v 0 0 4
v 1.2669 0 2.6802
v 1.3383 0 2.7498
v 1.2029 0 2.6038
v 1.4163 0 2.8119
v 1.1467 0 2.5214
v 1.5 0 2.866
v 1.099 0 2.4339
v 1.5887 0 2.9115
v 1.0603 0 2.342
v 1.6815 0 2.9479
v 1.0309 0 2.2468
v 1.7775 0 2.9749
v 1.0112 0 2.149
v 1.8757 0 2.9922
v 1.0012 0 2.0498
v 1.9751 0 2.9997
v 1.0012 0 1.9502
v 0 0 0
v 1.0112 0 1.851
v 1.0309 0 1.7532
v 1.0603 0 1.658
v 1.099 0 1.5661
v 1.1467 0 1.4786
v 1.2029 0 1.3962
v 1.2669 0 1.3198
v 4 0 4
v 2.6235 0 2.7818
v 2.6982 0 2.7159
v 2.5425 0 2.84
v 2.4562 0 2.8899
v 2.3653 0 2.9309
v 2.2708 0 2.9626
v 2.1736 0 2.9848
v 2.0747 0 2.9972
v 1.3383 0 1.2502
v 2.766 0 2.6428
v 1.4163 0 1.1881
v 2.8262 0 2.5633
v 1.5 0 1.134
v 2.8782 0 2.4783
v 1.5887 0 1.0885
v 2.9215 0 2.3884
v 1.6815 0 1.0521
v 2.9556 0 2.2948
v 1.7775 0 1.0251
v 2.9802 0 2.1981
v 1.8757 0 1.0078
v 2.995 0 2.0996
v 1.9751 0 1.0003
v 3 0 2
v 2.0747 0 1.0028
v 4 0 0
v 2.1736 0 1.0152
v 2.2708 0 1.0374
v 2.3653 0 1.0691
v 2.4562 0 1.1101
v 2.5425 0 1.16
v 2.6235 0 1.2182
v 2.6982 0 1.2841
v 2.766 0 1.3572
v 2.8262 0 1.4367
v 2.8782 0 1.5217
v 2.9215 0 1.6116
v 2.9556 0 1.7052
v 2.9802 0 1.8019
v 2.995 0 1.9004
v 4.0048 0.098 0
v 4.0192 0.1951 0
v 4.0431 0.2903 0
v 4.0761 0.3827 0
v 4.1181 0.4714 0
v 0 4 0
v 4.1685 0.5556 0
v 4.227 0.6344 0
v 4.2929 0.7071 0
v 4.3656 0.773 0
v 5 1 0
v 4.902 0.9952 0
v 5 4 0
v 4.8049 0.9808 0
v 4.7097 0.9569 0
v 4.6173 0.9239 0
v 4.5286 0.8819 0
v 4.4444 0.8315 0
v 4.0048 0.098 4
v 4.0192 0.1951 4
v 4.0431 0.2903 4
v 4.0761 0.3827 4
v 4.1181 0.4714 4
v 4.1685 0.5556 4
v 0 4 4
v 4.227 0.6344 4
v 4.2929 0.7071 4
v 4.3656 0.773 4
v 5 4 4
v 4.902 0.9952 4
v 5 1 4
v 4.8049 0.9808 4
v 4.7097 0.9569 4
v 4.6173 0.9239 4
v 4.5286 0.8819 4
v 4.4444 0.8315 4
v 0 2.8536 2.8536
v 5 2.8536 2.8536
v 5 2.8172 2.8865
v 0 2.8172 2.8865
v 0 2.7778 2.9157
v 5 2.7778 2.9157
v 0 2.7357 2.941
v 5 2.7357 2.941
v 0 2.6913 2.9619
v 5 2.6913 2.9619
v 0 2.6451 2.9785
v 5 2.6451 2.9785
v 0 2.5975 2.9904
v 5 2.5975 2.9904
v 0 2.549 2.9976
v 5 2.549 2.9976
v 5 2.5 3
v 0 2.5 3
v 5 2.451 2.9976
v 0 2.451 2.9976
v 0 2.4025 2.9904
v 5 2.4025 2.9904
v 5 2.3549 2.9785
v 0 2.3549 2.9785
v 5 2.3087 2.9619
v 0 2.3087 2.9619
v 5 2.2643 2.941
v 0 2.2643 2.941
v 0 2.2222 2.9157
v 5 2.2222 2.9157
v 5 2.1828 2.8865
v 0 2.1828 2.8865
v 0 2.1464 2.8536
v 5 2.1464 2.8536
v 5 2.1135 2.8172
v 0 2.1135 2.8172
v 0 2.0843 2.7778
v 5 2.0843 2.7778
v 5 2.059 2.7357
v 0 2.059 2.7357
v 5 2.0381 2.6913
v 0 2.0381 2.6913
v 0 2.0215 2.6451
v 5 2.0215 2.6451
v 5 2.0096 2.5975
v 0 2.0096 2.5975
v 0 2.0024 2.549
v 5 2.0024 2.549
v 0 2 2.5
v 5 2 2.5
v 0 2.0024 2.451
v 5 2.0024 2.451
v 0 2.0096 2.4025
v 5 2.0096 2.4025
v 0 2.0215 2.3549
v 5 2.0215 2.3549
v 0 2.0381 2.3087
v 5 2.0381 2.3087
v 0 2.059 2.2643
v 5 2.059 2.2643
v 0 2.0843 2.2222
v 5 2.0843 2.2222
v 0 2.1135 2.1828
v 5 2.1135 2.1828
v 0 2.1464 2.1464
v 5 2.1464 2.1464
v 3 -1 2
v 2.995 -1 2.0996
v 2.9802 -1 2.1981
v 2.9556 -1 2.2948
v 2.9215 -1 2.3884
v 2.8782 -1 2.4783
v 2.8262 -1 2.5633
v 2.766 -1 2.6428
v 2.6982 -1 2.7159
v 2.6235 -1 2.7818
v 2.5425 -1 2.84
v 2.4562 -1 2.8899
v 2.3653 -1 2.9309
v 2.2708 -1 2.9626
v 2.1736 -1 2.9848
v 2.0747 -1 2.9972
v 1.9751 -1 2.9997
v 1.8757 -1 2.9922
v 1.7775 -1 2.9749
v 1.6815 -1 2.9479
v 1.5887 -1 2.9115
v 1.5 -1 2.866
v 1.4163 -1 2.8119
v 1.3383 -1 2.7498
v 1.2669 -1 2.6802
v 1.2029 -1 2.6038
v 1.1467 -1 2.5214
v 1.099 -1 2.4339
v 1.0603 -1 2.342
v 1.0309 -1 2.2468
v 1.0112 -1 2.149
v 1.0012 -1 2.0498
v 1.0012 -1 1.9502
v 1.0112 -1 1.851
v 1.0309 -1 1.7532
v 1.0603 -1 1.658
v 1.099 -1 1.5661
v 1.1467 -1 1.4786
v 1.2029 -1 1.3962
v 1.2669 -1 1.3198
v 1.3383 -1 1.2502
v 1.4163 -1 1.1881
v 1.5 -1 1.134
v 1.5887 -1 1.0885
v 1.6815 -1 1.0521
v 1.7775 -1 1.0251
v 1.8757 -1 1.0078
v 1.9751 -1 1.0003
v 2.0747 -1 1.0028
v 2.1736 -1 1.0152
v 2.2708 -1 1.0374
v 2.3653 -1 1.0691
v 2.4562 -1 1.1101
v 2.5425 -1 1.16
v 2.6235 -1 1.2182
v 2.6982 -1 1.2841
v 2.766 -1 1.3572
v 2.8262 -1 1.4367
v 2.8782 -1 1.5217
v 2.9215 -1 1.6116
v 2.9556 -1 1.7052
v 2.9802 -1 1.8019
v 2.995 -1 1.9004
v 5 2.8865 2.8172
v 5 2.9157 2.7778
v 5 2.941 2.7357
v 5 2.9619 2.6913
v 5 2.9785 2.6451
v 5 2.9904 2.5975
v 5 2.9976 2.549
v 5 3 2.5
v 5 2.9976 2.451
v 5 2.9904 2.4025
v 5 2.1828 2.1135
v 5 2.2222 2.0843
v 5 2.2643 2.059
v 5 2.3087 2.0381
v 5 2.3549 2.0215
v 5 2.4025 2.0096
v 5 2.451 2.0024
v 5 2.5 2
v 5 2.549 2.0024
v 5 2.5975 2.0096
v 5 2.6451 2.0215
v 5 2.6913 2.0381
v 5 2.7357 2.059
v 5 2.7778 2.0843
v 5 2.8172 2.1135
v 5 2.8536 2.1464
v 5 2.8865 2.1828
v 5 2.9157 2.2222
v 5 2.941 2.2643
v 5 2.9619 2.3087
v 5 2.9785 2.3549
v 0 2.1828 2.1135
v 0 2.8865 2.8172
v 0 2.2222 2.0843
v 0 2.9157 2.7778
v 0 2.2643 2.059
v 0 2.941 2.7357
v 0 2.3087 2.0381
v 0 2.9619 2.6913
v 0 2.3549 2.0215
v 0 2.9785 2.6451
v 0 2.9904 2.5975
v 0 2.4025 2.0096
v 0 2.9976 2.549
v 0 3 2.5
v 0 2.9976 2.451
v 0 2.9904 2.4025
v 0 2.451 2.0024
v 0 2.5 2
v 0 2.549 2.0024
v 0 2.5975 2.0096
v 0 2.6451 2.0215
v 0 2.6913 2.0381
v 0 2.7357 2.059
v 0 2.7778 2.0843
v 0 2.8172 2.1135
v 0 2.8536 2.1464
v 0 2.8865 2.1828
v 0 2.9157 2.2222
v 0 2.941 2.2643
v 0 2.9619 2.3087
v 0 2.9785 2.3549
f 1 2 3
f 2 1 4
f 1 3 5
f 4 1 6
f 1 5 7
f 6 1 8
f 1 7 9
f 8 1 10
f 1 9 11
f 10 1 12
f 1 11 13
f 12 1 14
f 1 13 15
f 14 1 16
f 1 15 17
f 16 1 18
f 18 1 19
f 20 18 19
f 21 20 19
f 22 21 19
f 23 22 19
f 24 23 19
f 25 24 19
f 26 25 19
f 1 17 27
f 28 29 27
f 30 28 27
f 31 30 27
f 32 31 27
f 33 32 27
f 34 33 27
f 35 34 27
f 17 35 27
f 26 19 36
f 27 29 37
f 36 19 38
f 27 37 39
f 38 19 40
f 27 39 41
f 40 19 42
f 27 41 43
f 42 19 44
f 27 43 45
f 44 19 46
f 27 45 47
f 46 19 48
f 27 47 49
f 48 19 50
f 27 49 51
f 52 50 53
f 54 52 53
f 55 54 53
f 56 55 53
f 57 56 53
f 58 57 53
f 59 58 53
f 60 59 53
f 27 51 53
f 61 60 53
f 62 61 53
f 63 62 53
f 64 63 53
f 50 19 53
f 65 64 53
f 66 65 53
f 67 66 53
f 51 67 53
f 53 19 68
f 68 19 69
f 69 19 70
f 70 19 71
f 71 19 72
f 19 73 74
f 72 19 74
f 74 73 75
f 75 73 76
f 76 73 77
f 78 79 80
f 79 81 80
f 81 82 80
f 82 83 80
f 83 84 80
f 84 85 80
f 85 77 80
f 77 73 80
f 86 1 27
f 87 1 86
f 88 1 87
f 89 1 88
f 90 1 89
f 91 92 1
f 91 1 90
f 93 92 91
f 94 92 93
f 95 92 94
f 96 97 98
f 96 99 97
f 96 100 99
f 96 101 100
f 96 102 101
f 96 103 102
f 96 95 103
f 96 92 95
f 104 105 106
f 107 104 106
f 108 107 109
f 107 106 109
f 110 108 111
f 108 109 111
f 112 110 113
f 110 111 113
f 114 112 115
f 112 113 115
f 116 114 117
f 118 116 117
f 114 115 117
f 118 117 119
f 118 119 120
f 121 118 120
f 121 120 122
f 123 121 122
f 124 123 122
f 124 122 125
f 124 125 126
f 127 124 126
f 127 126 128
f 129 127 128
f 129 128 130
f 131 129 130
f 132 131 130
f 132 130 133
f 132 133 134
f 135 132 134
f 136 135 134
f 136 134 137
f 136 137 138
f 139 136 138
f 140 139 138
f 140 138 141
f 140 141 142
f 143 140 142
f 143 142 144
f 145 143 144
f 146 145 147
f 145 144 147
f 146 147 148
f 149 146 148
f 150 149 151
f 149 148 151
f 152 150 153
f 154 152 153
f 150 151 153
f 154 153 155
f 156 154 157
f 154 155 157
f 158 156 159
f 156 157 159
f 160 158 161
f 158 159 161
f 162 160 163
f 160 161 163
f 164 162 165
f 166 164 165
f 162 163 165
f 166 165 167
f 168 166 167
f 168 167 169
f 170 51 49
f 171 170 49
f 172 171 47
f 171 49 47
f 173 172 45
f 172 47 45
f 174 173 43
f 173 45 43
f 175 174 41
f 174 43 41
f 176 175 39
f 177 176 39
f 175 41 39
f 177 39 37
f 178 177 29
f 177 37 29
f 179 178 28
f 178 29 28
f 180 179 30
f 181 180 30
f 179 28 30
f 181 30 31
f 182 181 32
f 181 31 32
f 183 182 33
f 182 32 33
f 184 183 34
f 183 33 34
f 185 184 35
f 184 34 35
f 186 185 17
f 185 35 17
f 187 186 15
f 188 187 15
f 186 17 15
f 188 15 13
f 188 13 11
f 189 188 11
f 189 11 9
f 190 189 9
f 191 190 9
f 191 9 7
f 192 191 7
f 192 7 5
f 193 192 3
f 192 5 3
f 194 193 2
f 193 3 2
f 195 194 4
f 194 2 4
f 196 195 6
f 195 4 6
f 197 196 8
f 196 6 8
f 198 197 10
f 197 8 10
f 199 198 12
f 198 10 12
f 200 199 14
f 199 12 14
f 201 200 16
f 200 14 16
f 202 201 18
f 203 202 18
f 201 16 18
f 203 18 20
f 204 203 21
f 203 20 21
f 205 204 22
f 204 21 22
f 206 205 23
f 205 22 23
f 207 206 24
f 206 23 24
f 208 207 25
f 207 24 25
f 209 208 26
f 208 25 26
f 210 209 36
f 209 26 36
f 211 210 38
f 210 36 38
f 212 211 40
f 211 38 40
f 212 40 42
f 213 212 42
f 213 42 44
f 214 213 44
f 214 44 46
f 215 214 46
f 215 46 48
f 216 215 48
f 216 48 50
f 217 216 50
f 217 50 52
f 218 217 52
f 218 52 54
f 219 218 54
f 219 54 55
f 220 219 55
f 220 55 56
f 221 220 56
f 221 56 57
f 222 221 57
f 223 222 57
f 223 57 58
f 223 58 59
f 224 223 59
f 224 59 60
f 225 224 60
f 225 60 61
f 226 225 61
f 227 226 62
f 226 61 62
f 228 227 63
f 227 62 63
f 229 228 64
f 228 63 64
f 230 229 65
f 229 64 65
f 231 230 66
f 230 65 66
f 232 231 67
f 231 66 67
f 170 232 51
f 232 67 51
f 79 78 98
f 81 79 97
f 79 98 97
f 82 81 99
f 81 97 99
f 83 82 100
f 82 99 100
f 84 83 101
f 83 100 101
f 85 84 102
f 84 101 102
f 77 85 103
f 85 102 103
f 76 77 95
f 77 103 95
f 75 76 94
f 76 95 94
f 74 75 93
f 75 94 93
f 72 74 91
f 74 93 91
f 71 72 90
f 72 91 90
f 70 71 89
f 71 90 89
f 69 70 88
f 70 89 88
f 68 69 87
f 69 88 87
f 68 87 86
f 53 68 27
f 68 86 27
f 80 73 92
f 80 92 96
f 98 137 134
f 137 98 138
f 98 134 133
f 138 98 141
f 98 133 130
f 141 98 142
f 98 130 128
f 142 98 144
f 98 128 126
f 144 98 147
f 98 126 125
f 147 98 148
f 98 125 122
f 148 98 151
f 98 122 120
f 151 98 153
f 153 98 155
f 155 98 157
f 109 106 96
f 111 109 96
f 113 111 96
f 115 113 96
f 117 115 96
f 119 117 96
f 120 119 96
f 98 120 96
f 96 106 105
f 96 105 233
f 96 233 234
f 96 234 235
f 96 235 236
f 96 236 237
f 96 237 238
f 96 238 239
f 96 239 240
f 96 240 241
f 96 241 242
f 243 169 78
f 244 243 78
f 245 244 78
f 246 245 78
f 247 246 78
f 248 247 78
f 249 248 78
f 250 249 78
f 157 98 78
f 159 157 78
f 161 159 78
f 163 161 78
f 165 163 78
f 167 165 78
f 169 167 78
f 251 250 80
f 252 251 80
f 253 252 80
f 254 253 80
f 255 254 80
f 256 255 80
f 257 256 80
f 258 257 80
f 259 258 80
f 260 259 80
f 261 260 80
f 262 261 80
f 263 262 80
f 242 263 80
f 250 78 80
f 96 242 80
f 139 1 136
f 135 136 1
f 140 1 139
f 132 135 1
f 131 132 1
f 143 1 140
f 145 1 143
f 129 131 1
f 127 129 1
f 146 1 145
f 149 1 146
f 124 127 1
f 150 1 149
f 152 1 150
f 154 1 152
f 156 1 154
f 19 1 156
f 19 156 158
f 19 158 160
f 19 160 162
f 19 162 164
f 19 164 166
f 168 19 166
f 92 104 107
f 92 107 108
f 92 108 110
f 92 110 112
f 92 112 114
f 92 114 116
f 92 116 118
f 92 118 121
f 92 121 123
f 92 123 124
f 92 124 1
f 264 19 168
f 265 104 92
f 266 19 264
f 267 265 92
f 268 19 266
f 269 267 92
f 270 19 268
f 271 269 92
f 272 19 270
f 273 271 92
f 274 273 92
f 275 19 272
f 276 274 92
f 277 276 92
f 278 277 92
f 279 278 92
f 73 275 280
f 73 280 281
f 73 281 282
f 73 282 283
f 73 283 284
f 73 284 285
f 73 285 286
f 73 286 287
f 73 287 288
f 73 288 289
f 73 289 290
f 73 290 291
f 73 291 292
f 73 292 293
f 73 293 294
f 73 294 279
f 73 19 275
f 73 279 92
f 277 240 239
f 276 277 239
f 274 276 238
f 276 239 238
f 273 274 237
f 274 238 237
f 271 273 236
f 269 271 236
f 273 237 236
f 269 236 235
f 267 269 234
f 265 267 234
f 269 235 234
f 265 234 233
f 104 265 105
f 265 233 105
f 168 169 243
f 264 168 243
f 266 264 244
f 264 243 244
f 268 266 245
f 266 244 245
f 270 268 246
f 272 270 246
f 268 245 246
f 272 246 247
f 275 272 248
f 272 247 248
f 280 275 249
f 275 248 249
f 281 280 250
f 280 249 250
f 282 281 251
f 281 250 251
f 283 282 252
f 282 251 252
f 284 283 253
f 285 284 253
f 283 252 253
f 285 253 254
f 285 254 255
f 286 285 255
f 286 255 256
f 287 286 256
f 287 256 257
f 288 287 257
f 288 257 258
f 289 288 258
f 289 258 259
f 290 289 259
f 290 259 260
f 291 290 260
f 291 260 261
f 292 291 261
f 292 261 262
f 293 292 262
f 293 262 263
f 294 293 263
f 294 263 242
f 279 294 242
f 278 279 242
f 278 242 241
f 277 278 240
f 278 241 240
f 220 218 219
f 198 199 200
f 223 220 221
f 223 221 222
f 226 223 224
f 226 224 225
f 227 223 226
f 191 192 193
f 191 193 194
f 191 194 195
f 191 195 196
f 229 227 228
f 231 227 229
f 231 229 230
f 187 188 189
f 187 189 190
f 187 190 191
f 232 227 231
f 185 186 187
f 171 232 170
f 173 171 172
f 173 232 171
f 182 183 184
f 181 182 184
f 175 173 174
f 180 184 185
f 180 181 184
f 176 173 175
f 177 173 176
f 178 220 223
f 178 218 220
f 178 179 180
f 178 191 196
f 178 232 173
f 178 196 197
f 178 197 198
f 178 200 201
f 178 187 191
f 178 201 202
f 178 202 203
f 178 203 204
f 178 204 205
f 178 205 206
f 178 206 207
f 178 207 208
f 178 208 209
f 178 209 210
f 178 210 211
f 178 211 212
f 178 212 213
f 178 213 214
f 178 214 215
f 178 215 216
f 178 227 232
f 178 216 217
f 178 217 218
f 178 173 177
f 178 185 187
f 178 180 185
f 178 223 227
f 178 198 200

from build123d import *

# Parameters (mm, degrees)
F0_W     = 5
F0_H     = 4
F1_DEPTH = 4
F4_R     = 1
F5_DEPTH = 25
F6_R     = 1
F7_DEPTH = 1
F9_DEPTH = 25


with BuildPart() as f1:
    # F0 (on Top) → F1 (new body)
    with BuildSketch(Plane.XY):
        with Locations((2.5, 2)):
            Rectangle(F0_W, F0_H)
    extrude(amount=F1_DEPTH)

    # F4 (on face) → F5 (cut)
    with BuildSketch(Plane.XY.offset(4)):
        with Locations((5, 0)):
            Circle(F4_R)
    extrude(amount=-F5_DEPTH, mode=Mode.SUBTRACT)

    # F6 (on face) → F7 (join)
    with BuildSketch(Plane.XZ):
        with Locations((2, 2)):
            Circle(F6_R)
    extrude(amount=F7_DEPTH)

    # F8 (on face) → F9 (cut)
    with BuildSketch(Plane.YZ.offset(5)):
        with BuildLine():
            ThreePointArc((3, 2.5), (2.96194, 2.691342), (2.853553, 2.853553))
            Line((2.853553, 2.853553), (2.146447, 2.146447))
            ThreePointArc((2.146447, 2.146447), (2.691342, 2.03806), (3, 2.5))
        make_face()
        with BuildLine():
            Line((2.146447, 2.146447), (2.853553, 2.853553))
            ThreePointArc((2.853553, 2.853553), (2.146447, 2.853553), (2.146447, 2.146447))
        make_face()
    extrude(amount=-F9_DEPTH, mode=Mode.SUBTRACT)


solid = f1.part
